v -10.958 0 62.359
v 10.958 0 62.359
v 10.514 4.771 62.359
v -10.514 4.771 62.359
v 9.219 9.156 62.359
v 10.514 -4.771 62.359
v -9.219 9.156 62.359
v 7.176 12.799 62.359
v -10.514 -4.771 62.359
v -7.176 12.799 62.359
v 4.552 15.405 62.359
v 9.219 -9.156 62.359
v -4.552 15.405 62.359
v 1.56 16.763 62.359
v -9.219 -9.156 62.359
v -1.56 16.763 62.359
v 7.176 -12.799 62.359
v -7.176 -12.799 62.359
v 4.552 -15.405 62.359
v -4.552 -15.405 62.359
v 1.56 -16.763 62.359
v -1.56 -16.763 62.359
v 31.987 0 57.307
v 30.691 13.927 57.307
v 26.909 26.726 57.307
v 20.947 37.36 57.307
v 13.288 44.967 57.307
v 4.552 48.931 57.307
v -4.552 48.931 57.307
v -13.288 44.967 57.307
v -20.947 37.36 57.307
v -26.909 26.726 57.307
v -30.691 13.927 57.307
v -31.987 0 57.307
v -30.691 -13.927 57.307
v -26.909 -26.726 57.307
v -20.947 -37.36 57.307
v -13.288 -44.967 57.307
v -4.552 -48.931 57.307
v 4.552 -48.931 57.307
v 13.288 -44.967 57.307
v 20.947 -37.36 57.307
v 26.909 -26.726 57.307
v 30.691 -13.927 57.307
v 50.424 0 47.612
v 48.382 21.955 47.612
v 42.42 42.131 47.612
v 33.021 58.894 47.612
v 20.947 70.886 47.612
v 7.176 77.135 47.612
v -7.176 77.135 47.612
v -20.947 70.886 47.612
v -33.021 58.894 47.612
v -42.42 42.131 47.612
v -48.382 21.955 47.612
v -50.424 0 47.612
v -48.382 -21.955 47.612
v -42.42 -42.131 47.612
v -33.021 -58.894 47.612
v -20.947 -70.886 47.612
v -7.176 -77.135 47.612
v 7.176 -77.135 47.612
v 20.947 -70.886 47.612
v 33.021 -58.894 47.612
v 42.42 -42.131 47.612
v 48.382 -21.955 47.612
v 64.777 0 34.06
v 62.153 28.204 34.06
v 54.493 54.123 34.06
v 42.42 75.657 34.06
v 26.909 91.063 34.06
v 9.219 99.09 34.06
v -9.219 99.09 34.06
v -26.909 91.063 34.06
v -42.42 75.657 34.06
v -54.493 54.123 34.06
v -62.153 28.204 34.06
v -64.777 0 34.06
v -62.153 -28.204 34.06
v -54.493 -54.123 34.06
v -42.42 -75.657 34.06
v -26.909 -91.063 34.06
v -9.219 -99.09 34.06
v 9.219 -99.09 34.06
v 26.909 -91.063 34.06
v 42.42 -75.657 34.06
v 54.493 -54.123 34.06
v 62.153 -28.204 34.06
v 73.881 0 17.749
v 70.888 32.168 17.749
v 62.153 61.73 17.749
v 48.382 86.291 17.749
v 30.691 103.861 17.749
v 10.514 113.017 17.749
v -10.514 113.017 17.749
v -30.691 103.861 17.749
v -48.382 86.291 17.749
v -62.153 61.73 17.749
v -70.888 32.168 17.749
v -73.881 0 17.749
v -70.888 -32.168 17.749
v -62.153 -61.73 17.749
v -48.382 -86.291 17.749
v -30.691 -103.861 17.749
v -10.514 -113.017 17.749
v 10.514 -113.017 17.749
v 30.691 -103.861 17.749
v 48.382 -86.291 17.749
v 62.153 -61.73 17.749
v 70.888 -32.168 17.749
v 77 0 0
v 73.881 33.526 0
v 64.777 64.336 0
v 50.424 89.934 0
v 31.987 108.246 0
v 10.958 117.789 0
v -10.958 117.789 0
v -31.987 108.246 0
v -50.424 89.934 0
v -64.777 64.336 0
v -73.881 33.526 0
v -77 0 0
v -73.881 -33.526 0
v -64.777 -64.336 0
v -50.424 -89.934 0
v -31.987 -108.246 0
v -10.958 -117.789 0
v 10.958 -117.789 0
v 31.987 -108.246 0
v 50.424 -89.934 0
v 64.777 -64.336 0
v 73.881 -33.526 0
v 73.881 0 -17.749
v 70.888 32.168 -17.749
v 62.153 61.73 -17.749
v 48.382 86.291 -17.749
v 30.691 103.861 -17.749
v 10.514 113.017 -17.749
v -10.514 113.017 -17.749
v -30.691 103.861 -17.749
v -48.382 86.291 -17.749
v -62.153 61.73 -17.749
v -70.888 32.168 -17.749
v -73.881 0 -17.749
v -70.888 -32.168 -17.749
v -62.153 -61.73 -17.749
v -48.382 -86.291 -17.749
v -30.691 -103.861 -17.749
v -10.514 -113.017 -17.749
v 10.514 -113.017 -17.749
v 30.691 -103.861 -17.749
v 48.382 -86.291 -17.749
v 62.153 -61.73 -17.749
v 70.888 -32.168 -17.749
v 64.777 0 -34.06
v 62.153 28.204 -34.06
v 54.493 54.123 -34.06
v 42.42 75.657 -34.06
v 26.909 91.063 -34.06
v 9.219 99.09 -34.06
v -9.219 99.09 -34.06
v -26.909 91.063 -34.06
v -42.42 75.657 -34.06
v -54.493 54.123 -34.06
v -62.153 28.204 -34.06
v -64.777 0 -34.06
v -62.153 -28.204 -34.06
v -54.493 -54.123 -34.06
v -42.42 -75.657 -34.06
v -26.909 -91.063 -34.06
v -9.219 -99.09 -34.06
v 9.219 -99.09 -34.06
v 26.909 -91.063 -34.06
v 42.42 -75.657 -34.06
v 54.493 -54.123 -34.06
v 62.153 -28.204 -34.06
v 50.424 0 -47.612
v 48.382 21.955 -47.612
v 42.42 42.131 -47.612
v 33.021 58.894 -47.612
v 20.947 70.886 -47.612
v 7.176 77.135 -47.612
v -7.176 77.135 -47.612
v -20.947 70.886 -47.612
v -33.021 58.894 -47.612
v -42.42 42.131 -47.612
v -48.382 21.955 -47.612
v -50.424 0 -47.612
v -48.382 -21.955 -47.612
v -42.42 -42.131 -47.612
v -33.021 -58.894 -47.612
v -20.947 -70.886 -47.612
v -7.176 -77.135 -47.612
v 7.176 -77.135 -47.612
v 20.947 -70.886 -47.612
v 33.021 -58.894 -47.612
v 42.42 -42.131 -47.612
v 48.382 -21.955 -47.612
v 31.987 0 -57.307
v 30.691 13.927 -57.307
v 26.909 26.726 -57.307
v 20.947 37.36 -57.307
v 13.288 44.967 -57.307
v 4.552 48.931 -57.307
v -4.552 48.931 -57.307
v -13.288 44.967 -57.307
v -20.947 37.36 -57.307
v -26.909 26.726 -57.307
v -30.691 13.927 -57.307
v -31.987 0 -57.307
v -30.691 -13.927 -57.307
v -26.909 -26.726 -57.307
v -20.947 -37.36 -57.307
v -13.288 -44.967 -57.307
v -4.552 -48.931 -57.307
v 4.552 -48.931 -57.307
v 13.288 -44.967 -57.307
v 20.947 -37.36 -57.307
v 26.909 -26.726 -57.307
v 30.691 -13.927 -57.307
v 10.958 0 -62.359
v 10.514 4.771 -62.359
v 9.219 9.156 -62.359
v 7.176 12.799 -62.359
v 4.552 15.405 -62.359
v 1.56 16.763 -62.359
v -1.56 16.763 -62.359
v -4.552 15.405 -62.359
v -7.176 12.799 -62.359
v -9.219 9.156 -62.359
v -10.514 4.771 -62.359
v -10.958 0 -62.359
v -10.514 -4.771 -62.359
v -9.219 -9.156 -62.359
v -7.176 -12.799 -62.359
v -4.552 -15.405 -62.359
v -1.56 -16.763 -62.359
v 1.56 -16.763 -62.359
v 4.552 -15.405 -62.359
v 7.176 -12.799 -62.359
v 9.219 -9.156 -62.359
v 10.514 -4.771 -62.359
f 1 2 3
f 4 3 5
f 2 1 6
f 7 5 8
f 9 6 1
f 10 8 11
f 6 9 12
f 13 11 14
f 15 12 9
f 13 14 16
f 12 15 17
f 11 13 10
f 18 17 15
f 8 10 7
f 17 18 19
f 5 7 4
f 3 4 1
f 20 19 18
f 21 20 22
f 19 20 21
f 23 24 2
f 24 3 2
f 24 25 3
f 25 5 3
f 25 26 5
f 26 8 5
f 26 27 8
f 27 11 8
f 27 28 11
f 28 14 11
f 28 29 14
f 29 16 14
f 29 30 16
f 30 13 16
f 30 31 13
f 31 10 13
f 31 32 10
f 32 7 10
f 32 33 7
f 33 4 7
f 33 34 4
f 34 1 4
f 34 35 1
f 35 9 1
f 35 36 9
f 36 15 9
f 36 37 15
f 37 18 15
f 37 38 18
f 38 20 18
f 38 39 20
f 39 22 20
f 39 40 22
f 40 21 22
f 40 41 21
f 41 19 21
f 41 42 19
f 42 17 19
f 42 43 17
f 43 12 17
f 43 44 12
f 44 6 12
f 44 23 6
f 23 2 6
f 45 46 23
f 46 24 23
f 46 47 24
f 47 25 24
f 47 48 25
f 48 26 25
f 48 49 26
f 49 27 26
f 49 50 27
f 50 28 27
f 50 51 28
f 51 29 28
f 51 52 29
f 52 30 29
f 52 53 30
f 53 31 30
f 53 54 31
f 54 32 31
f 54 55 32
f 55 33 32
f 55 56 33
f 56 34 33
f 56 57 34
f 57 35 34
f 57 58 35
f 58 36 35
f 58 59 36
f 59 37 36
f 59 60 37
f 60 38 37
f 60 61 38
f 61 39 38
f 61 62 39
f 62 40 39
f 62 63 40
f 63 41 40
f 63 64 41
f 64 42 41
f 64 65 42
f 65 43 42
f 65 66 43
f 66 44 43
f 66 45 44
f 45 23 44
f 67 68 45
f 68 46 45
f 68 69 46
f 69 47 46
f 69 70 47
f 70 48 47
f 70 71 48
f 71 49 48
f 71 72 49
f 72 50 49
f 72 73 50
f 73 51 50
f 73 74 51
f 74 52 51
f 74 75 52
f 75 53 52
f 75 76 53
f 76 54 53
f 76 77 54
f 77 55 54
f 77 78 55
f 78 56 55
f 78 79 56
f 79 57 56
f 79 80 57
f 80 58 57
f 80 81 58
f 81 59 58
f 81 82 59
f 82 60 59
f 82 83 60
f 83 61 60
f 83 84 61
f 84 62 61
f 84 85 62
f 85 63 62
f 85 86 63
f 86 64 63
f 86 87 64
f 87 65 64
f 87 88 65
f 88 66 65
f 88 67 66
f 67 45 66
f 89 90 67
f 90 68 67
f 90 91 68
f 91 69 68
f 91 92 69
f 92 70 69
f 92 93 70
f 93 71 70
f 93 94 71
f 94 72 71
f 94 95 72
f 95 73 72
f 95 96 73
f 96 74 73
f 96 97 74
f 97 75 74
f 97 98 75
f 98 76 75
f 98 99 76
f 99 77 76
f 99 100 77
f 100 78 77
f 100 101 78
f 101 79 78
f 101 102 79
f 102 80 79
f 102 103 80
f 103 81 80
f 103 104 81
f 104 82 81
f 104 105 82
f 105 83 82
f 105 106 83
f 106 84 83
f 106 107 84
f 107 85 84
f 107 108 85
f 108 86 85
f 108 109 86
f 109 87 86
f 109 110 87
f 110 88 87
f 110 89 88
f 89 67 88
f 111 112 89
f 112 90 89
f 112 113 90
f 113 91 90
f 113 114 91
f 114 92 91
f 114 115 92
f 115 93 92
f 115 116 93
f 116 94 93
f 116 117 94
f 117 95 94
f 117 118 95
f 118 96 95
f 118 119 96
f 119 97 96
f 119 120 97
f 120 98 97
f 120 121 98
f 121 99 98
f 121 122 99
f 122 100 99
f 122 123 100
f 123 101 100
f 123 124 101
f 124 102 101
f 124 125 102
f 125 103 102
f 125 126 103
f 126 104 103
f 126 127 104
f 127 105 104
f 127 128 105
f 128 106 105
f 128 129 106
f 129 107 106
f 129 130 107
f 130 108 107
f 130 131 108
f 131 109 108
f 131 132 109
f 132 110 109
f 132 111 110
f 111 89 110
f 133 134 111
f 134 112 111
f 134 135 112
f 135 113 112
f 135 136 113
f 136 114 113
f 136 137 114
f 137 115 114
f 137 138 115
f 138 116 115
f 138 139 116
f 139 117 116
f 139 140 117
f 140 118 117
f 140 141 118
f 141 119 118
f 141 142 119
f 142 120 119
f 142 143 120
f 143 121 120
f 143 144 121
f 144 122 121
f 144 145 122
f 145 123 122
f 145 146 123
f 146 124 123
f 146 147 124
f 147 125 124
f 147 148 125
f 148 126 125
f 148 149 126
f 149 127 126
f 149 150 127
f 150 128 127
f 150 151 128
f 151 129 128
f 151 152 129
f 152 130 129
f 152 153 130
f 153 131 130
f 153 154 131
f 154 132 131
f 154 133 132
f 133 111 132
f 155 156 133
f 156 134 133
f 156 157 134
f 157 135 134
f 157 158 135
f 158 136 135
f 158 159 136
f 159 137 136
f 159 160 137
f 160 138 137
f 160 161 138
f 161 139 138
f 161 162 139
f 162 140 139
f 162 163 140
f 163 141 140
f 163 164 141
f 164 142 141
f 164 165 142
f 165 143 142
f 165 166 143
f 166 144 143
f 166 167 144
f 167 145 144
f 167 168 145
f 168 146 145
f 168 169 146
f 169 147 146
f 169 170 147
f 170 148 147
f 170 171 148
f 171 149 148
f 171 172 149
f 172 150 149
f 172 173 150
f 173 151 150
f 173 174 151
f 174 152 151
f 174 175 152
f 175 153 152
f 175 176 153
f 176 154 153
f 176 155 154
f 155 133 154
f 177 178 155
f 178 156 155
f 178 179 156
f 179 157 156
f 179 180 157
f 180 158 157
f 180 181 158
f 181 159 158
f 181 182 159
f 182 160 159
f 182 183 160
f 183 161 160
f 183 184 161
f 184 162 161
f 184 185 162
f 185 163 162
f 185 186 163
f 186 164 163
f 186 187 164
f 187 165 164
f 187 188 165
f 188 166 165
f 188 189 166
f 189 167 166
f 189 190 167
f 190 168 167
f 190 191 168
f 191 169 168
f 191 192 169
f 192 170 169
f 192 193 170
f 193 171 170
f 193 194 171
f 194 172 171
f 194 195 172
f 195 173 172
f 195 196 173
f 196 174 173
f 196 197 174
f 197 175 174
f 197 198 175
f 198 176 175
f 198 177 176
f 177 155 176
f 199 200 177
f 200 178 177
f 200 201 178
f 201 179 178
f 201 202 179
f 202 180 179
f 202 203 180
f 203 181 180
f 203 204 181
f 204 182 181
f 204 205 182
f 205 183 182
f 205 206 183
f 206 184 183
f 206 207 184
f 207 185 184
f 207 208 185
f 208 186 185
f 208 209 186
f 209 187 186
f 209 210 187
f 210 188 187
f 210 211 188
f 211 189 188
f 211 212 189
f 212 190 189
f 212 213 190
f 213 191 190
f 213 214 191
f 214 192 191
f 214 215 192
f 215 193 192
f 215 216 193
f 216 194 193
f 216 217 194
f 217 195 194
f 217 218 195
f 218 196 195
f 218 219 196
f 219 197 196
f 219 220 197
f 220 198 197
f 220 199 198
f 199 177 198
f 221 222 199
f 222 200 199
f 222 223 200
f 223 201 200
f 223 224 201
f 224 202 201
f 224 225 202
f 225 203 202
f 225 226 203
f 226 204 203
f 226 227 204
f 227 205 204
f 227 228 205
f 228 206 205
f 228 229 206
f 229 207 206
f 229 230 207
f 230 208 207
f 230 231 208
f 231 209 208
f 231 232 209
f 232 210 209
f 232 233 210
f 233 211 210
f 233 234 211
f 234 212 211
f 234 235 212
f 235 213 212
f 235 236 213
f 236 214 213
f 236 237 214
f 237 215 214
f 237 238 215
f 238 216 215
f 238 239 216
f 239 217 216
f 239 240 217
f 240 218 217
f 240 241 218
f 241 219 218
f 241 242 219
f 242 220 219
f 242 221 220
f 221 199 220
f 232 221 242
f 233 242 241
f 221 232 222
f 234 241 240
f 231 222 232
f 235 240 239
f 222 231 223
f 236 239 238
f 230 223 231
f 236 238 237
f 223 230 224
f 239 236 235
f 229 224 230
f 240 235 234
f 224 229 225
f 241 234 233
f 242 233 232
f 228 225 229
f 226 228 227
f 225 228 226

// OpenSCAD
// Generated by SolidPython 1.0.1 on 2020-07-29 00:46:50


scale(v = [11, 17, 9]) {
	sphere(r = 7);
}
/***********************************************
*********      SolidPython code:      **********
************************************************
 
# import packages: SolidPython
from solid import *
from solid.utils import *
from itertools import chain, combinations, permutations


class Resize:

    def __init__(self, scad_file):
        self.scad_file = scad_file
        #self.scad_file = import_scad(scad_file)
        # cone/cylinder param:
        self.r1 = 0
        self.r2 = 0
        self.h = 0
        # rectangular prism param:
        self.w = 0
        self.l = 0
        # ellipse param:
        self.r = 0

    # import OpenScad code (file name corresponds to shape)


    # classify shape + parameters
    def assign(self, param1, param2, param3):
        if self.scad_file == 'cone.scad':
            self.r1 = param1
            self.r2 = param2
            self.h = param3
        elif self.scad_file == 'cylinder.scad':
            self.r1 = param1
            self.r2 = param2
            self.h = param3
        elif self.scad_file == 'rectangularPrism.scad':
            self.h = param1
            self.l = param2
            self.w = param3
        else:
            self.r = param1
            self.h = param2

    # resize parameters
    def iterate(self):
        x = range(3, 20, 2)
        i = 1
        if self.scad_file == 'cone.scad':
            tempList = list(permutations(x, 2))
            for temp in tempList:
                param1 = temp[0]
                param2 = temp[1]
                filepath = 'produced_scad_files/' + 'cone' + str(param1) + '_' + str(param2) + '_' + '.scad'
                scad_render_to_file(cylinder(h=param1, r1=param2, r2=0), filepath)

        elif self.scad_file == 'cylinder.scad':
            tempList = list(permutations(x, 3))
            for temp in tempList:
                param1 = temp[0]
                param2 = temp[1]
                filepath = 'produced_scad_files/' + 'cylinder' + str(param1) + '_' + str(param2) + '_' + '.scad'
                scad_render_to_file(cylinder(h=param1, r1=param2, r2=param2), filepath)

        elif self.scad_file == 'rectangularPrism.scad':
            tempList = list(permutations(x, 3))
            for temp in tempList:
                param1 = temp[0]
                param2 = temp[1]
                param3 = temp[2]
                filepath = 'produced_scad_files/' + 'rectangularPrism' + str(param1) + '_' + str(param2) + '_' + str(
                    param3) + '.scad'
                scad_render_to_file(cube(size=(param1, param2, param3)), filepath)

        elif self.scad_file == 'ellipse.scad':
            tempList = list(permutations(x, 4))
            for temp in tempList:
                param1 = temp[0]
                param2 = temp[1]
                param3 = temp[2]
                param4 = temp[3]
                filepath = 'produced_scad_files/' + 'ellipse' + str(param1) + '_' + str(param2) + '_' + str(param3) + '_' + str(param4) + '.scad'
                scad_render_to_file(scale([param1, param2, param3])(sphere(r=param4)), filepath)

    def render_to_scadfile(self):
        scad_render_to_file(scad, 'example.scad') 
 
************************************************/
